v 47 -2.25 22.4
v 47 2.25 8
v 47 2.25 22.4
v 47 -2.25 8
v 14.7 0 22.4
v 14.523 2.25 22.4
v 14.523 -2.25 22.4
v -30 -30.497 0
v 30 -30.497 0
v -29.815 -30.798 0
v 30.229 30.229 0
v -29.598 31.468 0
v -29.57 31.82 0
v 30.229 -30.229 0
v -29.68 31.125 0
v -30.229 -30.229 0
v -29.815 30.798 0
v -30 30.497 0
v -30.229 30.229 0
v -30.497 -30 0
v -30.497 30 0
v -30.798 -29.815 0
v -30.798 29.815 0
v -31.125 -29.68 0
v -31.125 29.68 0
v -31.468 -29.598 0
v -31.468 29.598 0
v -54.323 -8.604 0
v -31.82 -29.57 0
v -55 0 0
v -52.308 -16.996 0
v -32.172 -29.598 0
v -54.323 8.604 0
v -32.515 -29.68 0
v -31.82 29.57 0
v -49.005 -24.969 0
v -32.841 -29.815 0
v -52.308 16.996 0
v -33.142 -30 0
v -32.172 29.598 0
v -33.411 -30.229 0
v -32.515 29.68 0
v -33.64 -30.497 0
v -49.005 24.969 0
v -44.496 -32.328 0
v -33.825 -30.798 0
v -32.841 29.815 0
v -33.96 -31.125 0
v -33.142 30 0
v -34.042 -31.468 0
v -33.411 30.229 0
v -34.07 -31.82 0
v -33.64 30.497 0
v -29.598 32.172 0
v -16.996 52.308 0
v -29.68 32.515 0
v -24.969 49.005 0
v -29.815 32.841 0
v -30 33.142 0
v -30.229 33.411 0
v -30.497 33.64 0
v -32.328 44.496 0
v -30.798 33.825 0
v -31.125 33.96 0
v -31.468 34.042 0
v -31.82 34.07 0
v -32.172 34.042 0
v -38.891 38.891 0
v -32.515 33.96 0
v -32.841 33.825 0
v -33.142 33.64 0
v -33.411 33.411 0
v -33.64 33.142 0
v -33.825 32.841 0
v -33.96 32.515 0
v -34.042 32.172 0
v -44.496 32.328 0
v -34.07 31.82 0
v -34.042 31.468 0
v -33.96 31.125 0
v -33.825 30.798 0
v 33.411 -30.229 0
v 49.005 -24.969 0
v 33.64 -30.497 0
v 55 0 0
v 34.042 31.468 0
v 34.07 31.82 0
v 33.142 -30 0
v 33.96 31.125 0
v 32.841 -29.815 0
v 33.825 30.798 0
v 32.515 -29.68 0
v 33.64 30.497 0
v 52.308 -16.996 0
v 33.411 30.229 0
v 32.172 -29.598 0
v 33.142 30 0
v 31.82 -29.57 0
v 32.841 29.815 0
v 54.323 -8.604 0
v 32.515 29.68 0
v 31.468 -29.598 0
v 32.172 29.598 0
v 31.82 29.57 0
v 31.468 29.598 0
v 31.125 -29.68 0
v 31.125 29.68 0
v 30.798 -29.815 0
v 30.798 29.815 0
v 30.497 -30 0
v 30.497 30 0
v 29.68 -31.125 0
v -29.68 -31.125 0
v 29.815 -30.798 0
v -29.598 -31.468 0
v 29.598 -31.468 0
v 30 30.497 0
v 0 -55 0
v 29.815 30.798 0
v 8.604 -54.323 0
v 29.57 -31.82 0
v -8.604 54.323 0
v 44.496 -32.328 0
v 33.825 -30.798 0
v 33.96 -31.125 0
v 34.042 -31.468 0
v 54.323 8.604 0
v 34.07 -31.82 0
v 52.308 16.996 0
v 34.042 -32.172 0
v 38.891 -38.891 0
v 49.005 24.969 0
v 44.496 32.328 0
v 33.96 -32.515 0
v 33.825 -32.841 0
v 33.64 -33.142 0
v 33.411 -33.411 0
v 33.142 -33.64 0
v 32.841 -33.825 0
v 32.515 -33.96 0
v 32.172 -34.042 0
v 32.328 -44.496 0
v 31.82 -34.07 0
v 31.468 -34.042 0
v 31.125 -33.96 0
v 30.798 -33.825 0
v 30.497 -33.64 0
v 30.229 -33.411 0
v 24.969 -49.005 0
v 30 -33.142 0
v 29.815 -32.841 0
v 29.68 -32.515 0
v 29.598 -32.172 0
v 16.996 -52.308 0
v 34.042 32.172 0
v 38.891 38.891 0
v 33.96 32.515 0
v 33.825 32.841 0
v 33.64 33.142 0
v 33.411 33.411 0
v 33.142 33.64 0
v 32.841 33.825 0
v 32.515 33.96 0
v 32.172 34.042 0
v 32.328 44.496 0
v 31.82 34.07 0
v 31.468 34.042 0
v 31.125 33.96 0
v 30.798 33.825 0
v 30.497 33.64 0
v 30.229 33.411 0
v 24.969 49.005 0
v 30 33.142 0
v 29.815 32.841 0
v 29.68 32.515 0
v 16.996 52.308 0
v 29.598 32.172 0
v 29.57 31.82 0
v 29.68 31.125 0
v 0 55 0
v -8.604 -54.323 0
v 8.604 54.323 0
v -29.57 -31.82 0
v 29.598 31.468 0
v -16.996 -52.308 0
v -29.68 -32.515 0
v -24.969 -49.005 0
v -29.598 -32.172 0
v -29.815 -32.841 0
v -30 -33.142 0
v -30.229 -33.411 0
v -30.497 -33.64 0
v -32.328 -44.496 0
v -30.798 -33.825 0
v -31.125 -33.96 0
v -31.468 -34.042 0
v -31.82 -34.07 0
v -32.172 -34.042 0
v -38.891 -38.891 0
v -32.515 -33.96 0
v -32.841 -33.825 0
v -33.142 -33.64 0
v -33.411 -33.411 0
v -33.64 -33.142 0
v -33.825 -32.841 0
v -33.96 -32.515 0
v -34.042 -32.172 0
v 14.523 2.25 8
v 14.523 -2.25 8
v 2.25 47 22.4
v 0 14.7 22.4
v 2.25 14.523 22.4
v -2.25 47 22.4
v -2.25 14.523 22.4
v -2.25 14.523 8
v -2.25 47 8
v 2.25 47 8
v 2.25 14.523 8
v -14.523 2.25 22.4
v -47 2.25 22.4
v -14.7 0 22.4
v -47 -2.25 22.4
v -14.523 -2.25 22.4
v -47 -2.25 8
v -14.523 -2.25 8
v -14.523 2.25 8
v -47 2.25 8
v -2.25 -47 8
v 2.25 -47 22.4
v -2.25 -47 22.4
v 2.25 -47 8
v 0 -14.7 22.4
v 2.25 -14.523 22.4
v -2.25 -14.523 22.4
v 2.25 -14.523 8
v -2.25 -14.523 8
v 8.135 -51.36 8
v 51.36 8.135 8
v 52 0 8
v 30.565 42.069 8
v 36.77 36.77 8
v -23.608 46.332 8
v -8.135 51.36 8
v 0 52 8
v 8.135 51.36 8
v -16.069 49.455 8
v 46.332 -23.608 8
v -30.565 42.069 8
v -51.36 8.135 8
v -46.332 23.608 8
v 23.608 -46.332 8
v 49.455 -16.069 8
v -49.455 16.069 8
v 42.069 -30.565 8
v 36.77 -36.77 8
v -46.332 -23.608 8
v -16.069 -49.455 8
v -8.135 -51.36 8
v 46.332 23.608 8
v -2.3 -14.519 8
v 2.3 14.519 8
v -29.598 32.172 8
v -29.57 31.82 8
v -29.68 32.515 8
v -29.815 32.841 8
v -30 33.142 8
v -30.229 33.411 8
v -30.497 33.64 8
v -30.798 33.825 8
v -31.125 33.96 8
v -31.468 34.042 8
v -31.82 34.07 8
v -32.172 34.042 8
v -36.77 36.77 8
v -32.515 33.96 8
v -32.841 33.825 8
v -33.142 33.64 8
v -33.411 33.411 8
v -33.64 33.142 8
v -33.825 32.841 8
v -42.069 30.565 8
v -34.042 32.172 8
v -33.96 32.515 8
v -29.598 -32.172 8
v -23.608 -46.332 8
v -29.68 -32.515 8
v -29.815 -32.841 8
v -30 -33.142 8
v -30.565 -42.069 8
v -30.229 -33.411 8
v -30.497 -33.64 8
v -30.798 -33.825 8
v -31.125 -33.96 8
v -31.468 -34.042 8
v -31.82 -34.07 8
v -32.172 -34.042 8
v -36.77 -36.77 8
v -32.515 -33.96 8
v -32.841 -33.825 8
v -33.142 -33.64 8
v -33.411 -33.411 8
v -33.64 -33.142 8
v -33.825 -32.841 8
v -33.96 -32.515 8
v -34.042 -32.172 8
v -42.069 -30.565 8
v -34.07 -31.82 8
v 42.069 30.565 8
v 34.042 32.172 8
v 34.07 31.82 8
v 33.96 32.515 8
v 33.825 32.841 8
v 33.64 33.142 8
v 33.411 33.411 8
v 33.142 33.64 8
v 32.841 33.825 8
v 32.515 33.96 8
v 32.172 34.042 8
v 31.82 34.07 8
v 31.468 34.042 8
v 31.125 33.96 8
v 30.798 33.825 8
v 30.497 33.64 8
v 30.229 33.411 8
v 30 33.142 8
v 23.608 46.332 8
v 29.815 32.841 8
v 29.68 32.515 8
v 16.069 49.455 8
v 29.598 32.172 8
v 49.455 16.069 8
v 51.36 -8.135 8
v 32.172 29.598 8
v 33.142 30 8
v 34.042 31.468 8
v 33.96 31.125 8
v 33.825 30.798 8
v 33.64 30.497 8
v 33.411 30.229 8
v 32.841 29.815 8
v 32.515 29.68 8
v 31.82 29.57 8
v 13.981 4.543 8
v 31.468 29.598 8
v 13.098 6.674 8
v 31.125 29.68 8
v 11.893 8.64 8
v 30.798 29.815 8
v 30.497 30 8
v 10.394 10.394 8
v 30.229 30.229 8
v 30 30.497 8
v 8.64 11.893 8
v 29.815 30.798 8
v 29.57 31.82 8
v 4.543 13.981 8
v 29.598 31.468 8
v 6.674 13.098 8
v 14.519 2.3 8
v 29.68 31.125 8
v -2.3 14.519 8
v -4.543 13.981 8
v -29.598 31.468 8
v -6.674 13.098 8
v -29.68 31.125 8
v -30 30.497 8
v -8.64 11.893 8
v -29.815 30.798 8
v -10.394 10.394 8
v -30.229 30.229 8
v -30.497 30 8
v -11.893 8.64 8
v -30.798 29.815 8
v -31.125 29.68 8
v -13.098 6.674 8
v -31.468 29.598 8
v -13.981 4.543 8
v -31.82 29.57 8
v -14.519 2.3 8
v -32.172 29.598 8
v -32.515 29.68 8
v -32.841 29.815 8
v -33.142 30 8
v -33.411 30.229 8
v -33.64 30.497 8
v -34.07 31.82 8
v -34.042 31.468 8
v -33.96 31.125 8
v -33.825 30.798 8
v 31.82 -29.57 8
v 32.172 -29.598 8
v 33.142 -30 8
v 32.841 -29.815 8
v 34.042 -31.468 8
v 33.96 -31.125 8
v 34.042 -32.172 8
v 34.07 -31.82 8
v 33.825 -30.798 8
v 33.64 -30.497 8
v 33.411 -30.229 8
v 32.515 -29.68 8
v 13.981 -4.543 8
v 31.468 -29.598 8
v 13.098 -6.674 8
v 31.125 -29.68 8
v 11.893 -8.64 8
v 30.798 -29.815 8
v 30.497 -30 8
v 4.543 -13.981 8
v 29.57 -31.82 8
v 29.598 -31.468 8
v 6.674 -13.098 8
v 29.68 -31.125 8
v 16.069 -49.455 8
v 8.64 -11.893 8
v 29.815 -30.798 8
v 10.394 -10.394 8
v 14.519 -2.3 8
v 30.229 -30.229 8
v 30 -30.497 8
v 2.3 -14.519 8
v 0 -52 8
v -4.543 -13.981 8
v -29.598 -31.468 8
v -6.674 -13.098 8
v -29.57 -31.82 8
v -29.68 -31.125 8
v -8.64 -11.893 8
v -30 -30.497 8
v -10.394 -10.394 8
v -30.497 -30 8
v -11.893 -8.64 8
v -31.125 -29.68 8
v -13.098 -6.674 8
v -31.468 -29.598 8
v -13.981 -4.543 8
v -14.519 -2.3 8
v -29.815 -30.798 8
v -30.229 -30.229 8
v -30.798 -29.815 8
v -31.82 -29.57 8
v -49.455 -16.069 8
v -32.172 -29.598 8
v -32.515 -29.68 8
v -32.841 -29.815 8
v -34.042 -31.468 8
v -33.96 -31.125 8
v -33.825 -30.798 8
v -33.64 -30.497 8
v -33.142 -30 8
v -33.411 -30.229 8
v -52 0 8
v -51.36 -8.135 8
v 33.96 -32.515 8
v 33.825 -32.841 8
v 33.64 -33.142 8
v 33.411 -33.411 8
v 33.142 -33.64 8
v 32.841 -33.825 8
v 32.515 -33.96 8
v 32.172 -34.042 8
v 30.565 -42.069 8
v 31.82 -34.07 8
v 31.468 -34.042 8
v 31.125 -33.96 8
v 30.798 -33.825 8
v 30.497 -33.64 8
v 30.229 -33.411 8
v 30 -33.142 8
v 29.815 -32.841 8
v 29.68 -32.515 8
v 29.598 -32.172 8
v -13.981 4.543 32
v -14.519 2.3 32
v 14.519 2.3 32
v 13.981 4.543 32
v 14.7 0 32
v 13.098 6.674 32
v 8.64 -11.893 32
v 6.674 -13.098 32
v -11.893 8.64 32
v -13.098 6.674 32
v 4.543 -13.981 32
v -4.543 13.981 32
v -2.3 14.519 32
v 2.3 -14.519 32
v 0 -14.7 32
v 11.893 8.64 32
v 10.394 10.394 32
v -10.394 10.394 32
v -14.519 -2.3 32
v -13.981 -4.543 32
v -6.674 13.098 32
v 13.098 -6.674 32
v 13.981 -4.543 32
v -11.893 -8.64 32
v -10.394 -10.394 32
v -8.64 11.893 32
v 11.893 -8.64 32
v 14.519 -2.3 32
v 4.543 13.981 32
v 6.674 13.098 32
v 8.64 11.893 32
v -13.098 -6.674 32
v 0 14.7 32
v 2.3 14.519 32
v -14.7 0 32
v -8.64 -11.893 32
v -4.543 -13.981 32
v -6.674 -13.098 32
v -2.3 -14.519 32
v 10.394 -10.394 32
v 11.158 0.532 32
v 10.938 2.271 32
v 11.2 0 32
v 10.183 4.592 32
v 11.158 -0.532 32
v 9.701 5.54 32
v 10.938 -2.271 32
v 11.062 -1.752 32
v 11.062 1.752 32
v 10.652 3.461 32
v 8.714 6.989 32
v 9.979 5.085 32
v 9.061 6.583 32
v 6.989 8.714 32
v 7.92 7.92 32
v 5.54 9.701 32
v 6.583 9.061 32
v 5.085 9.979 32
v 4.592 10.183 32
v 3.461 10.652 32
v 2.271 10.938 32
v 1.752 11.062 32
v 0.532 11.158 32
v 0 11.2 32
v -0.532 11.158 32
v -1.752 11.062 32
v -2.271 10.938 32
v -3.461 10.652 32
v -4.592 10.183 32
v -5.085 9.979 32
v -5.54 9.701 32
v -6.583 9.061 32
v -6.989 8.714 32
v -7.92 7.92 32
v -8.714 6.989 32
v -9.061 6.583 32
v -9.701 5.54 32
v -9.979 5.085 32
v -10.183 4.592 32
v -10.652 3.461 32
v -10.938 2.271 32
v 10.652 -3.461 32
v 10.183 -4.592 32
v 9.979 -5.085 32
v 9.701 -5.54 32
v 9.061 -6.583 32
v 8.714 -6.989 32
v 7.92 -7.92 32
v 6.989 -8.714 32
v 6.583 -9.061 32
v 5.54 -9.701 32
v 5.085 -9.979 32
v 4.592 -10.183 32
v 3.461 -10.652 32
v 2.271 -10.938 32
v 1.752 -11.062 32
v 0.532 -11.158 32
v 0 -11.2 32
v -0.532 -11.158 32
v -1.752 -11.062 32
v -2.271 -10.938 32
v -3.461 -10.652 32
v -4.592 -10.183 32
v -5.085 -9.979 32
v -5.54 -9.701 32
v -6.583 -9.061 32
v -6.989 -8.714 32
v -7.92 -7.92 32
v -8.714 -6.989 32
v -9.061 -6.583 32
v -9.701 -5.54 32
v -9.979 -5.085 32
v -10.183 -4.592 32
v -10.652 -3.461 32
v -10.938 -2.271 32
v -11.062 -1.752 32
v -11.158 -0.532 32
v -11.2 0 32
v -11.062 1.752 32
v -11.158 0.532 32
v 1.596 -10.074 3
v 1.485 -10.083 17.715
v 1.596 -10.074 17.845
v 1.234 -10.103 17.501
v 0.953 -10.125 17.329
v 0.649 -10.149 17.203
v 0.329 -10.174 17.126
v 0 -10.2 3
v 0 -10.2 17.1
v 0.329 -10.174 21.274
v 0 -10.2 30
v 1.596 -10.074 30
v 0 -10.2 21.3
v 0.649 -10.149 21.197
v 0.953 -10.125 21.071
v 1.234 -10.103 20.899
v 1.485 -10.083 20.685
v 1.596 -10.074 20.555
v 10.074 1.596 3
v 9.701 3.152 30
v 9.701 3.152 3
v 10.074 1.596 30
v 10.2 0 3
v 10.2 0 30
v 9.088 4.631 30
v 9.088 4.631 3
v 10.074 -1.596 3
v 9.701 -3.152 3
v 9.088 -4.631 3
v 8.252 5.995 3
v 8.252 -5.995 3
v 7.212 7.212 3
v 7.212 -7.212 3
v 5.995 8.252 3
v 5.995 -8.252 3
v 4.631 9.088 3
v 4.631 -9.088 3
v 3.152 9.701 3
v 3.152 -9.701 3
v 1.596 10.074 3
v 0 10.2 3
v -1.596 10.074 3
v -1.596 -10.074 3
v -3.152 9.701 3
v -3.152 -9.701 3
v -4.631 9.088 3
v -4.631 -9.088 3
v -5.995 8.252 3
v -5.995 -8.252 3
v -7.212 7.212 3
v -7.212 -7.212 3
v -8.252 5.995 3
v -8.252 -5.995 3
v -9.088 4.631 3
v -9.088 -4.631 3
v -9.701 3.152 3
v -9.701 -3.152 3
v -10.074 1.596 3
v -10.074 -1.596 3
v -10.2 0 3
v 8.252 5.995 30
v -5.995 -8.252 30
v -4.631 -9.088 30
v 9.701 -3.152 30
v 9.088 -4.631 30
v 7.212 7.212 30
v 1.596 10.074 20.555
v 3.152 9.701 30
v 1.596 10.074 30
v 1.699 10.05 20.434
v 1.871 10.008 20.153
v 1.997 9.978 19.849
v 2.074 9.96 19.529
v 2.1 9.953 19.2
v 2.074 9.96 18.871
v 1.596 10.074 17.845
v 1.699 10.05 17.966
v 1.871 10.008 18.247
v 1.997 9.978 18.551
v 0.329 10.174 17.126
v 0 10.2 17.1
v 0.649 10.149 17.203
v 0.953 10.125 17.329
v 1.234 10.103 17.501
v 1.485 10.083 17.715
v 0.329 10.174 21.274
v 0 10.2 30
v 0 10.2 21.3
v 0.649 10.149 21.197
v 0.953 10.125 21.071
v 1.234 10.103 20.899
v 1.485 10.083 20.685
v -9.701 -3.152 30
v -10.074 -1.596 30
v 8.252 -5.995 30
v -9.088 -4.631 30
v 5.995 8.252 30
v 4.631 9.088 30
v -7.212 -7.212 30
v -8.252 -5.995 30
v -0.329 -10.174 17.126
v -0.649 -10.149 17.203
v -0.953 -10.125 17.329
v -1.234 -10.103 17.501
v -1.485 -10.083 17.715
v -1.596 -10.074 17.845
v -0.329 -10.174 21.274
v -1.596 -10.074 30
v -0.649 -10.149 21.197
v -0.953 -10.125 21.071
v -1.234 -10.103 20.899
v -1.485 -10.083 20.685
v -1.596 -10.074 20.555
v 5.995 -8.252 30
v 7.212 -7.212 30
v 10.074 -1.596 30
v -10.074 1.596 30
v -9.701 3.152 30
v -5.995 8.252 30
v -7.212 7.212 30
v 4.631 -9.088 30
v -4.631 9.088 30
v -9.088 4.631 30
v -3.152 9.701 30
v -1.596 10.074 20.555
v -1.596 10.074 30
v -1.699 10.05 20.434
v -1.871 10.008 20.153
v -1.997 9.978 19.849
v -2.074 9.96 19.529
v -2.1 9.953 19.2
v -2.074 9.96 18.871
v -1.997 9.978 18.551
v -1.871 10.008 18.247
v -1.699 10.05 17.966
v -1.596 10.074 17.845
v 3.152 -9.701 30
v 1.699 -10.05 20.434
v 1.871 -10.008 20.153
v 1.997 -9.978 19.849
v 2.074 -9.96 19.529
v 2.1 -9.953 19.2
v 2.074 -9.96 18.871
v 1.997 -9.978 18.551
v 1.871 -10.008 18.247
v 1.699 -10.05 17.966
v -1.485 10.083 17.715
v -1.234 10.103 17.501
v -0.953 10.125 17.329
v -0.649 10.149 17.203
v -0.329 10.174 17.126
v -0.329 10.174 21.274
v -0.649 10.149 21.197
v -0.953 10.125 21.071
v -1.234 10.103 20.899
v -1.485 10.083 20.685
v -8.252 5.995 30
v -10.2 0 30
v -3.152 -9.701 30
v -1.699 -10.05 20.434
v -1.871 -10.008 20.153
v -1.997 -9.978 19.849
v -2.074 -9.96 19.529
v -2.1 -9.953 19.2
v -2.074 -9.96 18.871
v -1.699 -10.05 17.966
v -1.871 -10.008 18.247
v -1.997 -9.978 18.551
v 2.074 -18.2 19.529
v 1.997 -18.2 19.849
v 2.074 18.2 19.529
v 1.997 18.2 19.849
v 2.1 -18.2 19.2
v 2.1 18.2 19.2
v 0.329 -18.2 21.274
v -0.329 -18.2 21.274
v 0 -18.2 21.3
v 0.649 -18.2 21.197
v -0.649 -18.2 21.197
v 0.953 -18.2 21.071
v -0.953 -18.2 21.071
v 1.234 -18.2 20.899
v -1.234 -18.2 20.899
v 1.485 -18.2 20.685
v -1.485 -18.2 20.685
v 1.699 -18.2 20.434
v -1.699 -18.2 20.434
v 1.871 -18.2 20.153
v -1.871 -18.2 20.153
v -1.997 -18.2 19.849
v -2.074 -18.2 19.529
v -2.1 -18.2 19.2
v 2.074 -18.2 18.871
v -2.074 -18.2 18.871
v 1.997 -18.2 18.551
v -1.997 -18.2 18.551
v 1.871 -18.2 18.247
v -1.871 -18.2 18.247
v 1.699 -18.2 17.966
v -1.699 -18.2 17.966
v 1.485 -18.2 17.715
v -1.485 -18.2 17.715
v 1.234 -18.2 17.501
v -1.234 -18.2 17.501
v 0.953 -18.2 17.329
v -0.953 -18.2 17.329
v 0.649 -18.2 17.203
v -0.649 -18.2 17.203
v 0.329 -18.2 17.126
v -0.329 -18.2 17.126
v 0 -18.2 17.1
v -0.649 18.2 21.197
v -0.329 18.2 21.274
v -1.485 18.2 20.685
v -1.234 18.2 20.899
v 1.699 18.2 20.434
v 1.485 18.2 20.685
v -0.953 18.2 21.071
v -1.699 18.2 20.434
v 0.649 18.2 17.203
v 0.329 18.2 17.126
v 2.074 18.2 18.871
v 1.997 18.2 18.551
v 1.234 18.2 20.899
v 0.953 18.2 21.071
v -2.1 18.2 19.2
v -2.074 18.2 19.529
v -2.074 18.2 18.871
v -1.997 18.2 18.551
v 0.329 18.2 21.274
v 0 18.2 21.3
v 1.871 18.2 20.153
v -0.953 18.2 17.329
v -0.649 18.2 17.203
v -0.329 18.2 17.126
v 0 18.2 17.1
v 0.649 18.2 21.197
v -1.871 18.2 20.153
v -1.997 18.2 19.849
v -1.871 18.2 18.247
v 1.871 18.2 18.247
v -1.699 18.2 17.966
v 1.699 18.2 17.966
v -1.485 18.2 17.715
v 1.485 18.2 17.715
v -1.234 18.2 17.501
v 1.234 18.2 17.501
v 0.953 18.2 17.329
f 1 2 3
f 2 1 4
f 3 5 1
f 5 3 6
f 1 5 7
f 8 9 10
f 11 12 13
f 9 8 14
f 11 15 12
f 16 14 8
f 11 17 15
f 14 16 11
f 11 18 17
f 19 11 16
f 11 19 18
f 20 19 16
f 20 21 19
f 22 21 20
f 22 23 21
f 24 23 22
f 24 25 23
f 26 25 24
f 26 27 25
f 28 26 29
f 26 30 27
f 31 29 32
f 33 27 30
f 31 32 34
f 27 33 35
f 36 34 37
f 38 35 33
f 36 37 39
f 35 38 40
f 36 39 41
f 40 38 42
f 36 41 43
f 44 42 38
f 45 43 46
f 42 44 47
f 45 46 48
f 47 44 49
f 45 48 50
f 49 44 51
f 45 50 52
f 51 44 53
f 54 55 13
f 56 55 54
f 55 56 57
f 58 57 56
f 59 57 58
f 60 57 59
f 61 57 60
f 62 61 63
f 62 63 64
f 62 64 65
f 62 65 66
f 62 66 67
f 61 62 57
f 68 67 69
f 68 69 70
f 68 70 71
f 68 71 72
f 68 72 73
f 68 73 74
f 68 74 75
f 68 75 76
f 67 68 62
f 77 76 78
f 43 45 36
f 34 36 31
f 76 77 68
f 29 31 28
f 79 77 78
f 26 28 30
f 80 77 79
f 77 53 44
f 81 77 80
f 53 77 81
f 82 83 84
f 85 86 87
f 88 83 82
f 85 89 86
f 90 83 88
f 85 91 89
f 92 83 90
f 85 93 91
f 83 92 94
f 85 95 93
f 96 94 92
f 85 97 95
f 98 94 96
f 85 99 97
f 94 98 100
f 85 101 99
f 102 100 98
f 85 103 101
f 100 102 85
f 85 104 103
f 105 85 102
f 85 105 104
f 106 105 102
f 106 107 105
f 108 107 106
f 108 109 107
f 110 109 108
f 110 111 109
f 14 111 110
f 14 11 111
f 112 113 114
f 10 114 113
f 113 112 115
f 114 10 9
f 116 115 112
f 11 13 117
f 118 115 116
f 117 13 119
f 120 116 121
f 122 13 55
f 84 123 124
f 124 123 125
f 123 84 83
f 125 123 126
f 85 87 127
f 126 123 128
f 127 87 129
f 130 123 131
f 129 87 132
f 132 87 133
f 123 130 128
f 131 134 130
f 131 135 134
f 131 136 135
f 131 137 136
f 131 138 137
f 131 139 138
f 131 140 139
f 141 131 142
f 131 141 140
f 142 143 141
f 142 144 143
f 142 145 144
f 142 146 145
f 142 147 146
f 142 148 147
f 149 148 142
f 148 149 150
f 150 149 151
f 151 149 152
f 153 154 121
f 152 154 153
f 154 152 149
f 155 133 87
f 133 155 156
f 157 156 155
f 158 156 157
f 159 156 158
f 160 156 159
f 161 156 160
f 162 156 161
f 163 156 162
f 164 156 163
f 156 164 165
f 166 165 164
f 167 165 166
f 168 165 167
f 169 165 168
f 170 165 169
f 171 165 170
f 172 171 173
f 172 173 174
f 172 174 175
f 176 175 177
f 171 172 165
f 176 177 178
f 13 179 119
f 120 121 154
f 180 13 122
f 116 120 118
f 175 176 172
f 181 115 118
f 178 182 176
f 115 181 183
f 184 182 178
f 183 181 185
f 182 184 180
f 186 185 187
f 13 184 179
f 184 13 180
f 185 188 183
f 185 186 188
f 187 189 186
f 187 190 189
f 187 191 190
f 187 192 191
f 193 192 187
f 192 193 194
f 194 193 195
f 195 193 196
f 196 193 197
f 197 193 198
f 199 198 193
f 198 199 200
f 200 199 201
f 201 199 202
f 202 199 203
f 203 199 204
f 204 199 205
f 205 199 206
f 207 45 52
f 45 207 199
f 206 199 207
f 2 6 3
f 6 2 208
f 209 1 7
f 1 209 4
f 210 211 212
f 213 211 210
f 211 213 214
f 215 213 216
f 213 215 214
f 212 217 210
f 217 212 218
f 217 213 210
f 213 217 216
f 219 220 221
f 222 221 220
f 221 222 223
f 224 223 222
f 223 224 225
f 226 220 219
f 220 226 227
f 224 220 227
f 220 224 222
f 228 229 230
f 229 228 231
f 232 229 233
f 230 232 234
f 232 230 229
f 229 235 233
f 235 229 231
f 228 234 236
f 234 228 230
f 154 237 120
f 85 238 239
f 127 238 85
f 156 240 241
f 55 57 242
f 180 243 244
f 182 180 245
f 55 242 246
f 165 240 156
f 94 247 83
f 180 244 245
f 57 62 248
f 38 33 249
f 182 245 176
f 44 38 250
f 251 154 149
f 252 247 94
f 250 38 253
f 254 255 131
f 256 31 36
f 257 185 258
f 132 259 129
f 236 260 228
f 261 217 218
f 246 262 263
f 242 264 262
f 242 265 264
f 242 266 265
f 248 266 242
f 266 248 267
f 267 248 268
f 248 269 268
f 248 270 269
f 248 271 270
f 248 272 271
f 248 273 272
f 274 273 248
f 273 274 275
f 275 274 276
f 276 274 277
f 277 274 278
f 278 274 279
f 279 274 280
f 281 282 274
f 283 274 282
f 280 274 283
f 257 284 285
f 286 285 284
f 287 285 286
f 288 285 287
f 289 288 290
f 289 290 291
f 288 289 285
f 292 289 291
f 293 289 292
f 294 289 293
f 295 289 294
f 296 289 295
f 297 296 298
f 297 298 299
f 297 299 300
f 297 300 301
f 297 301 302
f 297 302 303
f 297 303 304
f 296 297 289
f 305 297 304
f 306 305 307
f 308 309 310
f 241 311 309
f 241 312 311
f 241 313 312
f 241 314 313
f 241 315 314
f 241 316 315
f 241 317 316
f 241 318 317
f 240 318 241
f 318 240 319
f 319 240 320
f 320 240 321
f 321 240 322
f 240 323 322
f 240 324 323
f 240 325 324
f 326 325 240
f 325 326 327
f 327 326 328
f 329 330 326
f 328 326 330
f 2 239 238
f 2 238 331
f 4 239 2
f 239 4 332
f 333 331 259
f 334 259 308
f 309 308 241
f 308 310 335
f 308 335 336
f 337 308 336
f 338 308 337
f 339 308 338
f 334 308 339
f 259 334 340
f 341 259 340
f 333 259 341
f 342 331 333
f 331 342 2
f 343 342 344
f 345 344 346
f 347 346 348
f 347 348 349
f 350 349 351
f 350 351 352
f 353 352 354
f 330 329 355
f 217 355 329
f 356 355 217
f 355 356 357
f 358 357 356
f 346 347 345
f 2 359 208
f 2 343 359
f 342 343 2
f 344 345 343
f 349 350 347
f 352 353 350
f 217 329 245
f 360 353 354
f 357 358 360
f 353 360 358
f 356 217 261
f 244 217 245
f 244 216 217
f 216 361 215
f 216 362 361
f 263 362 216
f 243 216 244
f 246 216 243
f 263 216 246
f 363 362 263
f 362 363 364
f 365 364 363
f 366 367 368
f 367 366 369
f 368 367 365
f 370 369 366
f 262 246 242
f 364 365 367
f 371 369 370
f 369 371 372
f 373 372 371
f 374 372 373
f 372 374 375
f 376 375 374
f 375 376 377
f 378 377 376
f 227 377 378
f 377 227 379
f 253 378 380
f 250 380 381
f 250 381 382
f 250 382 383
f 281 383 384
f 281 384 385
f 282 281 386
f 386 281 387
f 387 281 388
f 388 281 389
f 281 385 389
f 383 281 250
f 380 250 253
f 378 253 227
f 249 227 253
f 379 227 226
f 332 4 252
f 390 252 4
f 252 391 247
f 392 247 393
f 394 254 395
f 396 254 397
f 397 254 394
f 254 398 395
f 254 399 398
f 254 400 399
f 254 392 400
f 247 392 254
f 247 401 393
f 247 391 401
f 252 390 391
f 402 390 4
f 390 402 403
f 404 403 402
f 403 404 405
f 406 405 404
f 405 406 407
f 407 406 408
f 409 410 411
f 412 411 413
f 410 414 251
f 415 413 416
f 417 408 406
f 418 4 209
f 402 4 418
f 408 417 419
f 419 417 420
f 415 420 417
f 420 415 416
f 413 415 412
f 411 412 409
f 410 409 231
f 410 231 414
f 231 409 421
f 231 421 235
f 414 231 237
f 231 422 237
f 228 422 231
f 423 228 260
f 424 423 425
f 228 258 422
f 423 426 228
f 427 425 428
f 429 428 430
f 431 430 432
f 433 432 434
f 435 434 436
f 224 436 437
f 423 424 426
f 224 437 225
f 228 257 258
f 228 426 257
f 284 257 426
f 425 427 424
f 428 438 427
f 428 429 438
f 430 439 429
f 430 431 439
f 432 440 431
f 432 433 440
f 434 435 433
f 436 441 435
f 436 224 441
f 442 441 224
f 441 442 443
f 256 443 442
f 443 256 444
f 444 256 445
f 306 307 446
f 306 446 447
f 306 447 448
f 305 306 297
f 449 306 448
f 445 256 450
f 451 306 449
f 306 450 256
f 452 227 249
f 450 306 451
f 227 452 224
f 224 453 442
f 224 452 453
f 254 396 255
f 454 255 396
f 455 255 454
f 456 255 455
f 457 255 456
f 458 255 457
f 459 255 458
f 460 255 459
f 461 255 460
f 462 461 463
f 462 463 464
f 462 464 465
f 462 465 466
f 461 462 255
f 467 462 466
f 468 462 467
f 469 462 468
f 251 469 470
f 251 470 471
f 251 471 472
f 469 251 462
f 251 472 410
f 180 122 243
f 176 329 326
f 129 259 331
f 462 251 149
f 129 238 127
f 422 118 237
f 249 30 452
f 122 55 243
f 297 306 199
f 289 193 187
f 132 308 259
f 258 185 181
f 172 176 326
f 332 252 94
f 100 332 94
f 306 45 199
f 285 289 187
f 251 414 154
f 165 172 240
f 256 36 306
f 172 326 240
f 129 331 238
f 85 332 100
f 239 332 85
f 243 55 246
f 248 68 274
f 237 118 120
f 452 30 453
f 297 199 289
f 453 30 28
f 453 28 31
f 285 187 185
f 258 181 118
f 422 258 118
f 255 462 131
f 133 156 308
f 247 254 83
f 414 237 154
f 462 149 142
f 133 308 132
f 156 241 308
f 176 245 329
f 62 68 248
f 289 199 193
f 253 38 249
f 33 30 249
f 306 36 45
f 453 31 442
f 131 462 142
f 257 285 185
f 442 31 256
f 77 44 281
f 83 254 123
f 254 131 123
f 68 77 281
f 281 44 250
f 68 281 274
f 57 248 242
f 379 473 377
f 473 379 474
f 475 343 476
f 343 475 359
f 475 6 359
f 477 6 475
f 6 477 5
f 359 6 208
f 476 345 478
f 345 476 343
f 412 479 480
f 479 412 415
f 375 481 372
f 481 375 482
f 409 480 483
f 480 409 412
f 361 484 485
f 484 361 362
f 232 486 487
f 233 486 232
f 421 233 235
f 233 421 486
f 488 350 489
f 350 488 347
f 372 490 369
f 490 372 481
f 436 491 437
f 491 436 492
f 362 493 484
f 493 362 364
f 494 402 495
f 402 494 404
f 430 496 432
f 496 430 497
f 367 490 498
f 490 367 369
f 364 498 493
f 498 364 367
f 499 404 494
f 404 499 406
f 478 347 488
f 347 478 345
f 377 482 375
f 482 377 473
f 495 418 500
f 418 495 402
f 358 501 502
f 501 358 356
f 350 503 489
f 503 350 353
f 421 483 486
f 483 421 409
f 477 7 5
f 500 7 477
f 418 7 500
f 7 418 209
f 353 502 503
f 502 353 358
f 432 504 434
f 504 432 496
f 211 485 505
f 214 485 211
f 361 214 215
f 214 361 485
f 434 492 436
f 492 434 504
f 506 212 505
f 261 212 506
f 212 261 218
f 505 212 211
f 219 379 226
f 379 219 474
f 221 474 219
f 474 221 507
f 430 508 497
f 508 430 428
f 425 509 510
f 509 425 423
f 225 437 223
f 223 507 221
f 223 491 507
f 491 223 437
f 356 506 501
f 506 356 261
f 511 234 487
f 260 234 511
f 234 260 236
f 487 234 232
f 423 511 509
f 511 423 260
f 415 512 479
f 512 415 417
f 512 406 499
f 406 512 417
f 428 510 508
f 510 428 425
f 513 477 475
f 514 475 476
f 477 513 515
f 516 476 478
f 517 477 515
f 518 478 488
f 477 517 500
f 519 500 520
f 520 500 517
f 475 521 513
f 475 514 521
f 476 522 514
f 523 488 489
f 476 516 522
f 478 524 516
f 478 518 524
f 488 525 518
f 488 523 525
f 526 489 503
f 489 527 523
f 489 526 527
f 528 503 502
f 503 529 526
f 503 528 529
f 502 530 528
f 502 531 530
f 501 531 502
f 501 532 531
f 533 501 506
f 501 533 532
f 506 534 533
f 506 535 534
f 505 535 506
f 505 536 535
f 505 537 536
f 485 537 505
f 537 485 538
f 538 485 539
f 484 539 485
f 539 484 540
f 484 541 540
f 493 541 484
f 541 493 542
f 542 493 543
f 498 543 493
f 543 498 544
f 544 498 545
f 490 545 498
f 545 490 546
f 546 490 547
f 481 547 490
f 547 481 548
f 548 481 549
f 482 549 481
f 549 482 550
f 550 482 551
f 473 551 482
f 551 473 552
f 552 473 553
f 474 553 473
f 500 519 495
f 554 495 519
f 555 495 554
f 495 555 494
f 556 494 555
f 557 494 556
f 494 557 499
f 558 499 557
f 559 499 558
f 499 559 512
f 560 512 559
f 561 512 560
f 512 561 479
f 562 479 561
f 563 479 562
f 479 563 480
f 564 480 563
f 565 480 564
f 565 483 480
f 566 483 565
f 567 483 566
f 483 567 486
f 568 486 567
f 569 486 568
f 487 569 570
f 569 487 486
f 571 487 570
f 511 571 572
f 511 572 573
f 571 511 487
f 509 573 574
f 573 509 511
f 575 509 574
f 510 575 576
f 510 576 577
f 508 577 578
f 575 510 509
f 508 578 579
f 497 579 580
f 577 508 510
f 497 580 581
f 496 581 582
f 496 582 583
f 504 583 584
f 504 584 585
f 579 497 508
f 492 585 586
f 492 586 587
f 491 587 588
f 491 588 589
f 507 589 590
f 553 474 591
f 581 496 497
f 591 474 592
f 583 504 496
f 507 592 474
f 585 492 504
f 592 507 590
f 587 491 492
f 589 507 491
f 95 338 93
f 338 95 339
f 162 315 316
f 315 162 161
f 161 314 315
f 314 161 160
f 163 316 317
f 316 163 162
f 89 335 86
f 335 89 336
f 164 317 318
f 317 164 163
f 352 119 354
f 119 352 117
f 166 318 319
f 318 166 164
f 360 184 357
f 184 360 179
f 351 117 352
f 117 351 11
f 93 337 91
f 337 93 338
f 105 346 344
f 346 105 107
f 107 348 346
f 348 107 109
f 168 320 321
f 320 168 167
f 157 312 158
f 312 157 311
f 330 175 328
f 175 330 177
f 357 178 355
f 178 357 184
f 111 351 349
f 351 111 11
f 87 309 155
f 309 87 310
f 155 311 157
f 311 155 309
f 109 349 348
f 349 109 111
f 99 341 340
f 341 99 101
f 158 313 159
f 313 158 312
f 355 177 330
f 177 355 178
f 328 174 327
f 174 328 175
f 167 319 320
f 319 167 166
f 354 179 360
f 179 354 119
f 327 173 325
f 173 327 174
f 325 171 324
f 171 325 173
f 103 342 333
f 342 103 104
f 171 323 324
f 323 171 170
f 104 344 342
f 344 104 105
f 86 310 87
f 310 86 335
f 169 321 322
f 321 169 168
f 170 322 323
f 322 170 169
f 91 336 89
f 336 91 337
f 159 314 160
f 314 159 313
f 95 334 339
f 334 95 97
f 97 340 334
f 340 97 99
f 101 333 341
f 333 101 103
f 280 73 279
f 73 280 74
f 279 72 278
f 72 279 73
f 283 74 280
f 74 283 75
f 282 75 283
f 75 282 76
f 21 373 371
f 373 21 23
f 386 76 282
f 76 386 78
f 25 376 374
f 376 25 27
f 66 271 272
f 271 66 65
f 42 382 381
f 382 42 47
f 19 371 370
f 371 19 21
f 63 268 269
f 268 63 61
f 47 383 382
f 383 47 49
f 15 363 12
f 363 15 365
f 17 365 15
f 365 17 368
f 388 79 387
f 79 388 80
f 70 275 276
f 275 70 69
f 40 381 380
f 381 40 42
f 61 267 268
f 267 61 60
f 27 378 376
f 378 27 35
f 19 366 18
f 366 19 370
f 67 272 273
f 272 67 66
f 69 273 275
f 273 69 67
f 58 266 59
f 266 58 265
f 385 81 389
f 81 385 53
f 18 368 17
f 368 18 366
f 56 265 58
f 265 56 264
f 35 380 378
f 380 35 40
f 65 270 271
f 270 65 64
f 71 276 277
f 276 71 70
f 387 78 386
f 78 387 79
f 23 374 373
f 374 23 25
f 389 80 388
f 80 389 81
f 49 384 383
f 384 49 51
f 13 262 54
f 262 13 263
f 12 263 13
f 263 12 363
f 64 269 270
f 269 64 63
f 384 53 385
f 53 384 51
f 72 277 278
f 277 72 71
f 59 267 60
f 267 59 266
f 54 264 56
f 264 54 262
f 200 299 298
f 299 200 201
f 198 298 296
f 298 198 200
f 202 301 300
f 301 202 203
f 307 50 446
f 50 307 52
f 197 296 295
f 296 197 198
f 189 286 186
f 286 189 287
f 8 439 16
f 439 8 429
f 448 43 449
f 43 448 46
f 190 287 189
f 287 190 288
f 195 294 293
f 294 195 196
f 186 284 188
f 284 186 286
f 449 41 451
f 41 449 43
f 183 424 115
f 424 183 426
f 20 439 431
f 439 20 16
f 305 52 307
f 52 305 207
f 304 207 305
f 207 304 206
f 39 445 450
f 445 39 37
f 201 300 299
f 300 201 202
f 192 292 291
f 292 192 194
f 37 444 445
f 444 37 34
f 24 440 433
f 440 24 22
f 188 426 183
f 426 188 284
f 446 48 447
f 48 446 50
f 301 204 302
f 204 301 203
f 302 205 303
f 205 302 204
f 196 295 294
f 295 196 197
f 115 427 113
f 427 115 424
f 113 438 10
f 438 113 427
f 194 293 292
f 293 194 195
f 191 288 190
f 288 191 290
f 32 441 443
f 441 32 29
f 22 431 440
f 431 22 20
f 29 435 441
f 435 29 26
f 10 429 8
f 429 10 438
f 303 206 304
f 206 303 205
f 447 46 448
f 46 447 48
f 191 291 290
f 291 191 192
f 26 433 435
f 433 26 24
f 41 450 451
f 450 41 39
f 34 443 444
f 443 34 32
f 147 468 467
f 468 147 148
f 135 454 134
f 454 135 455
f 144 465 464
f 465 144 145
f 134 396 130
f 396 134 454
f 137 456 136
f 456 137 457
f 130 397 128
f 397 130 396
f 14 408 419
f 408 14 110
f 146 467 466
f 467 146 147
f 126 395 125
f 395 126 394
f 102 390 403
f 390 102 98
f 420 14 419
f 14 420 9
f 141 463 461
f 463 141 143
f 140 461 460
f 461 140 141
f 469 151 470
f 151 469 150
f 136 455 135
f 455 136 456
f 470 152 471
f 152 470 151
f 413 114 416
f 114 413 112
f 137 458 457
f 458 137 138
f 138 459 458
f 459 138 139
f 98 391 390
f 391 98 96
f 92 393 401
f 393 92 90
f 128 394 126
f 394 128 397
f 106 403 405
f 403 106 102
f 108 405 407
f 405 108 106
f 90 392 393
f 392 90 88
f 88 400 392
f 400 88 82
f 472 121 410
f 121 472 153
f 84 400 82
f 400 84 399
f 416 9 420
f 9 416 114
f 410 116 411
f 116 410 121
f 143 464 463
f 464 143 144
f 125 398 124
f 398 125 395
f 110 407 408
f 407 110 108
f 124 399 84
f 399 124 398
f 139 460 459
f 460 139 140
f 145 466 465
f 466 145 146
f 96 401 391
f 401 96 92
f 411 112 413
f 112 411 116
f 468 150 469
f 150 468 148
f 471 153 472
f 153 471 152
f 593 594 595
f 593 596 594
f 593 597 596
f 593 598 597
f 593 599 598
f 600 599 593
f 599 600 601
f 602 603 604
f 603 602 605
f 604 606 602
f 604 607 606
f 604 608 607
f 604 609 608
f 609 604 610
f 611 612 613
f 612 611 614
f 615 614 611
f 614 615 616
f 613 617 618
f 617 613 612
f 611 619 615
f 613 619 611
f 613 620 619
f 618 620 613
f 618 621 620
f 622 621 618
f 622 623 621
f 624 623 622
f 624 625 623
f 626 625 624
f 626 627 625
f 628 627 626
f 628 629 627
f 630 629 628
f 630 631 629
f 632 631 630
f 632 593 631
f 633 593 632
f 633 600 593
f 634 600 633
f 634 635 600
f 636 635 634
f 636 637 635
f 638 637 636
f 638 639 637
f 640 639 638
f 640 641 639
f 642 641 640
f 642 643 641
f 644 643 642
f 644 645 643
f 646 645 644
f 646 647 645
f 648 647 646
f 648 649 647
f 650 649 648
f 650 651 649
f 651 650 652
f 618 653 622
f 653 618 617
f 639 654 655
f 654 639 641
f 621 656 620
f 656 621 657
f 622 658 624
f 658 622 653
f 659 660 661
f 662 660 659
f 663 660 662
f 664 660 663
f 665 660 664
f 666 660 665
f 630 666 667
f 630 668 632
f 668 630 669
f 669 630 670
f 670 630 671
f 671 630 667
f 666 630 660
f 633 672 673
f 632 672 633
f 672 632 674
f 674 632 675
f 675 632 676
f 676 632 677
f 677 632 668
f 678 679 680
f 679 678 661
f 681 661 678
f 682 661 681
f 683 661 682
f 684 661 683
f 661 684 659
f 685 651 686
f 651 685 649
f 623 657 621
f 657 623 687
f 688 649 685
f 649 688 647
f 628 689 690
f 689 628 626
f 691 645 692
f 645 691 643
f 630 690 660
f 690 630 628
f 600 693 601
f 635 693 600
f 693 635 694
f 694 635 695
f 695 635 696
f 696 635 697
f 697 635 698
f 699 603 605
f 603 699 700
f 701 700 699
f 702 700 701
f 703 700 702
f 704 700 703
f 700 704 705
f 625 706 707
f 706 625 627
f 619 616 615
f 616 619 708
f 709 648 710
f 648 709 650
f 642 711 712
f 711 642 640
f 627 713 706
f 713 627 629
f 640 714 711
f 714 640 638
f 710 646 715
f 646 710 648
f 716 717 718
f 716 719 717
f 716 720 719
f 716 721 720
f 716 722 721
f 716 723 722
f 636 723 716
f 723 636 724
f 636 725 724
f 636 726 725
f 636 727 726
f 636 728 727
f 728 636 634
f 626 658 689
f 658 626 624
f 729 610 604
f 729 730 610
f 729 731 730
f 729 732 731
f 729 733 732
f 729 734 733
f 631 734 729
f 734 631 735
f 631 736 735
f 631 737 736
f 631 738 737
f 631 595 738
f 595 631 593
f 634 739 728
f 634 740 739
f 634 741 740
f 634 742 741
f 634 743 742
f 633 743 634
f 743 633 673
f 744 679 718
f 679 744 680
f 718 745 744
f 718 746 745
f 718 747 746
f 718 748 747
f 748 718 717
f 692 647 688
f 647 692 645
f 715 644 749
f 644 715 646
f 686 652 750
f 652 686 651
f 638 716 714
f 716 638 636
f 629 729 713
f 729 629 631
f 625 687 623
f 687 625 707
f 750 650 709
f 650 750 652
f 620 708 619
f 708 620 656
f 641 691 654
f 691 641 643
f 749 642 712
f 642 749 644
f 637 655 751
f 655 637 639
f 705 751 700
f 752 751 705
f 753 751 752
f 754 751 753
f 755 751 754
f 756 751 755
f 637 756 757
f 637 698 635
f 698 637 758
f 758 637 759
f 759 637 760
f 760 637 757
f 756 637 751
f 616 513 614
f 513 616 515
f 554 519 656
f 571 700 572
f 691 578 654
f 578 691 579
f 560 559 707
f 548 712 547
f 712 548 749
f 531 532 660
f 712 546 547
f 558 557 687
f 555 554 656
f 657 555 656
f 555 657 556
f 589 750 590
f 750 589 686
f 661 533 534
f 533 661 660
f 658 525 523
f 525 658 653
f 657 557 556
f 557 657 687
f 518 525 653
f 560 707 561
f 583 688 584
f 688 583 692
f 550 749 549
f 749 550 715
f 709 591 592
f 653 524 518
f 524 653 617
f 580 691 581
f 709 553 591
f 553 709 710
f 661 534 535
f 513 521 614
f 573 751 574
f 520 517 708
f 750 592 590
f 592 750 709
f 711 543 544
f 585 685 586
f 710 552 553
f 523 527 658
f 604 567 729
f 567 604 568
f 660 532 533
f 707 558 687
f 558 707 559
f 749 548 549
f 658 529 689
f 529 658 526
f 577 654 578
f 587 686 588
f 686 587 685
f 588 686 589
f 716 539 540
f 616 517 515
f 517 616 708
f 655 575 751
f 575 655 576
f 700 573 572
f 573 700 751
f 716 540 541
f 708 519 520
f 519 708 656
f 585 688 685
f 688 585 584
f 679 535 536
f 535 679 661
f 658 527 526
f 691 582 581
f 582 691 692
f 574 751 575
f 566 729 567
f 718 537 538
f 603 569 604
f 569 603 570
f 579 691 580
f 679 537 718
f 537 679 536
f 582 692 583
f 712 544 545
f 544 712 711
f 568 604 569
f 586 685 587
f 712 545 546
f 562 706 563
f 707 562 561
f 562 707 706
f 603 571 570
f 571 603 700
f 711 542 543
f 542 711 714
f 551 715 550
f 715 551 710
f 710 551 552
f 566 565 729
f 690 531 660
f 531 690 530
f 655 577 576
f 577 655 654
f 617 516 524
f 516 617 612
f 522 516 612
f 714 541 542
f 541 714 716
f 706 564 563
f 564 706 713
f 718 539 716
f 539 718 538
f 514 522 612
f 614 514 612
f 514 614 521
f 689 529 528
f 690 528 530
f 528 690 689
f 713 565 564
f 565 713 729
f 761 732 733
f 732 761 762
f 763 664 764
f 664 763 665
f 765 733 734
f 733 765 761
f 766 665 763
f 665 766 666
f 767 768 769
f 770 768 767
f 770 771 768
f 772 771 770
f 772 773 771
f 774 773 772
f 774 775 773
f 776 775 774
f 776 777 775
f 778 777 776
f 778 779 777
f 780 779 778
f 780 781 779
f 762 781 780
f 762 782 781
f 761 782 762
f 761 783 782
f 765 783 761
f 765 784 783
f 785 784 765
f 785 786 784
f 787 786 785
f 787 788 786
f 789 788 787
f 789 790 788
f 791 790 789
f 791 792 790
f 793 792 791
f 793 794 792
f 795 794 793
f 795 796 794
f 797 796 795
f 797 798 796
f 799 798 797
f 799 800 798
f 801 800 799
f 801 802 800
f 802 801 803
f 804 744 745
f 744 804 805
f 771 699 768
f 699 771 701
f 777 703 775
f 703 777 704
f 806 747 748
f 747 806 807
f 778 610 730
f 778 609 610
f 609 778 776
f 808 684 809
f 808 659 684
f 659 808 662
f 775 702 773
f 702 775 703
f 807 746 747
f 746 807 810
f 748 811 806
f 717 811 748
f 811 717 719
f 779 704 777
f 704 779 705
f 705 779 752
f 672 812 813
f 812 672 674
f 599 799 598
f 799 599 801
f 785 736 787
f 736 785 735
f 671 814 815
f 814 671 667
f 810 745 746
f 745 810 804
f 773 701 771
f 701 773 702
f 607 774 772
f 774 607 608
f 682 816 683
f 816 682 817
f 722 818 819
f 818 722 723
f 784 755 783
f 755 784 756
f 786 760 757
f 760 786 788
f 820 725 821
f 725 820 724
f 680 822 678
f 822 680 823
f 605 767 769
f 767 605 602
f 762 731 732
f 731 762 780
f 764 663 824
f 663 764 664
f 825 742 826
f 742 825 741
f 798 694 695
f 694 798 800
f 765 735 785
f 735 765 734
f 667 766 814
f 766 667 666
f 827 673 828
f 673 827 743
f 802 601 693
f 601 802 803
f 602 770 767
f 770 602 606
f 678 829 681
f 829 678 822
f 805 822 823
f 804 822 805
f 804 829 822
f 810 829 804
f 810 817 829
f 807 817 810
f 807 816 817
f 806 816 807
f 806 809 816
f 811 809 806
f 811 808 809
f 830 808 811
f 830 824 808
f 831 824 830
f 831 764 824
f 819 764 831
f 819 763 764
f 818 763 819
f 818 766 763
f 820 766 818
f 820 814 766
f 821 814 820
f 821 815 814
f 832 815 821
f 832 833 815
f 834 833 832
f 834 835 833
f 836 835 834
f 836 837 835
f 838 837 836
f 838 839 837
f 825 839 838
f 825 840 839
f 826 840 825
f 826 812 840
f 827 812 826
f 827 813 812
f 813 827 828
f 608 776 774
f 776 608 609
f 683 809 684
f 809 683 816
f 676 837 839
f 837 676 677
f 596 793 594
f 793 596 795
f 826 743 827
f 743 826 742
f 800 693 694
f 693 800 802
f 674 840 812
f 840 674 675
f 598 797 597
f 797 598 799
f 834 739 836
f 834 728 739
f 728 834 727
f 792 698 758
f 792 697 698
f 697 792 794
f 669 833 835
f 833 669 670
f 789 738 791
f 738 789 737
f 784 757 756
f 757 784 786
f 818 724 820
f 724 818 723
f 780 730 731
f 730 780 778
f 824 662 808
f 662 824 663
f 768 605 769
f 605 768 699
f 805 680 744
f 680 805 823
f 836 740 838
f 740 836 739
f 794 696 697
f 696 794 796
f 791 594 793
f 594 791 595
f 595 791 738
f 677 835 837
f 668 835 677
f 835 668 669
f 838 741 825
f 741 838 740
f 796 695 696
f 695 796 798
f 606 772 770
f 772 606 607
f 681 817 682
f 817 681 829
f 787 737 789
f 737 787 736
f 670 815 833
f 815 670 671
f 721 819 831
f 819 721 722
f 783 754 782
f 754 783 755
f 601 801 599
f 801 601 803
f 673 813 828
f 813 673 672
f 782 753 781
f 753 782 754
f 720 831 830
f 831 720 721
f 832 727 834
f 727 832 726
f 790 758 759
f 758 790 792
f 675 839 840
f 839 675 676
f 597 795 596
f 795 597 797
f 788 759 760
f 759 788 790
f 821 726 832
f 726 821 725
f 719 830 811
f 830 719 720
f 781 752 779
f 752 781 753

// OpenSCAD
// file: tower_base_and_stand.scad
// ====================================================================
// Tower Base & Modular Mast (100% 3D-Printable)
// 
// Features:
// - Wide, stable holiday-styled baseplate (can be clamped, screwed, or weighted)
// - 20mm upper socket accepts:
//     Option A: Standard wooden dowel or PVC pipe (custom height)
//     Option B: Stackable 3D-printed lattice mast segments (provided below)
// ====================================================================

$fn = 40;

base_dia       = 110.0; // Wide footprint for stability against cable tension
base_th        = 8.0;   // Solid base thickness
socket_inner_d = 20.4;  // Fits 20mm dowel or lattice mast plug
socket_wall    = 4.5;
socket_h       = 32.0;

// 1. Sturdy Baseplate
module tower_base() {
    difference() {
        union() {
            // Main disc with beveled edge
            cylinder(d1 = base_dia, d2 = base_dia - 6, h = base_th);
            
            // Central socket column
            translate([0, 0, 0])
                cylinder(d = socket_inner_d + (socket_wall * 2), h = socket_h);
                
            // 4x Rigid support ribs
            for (a = [0 : 90 : 270]) {
                rotate([0, 0, a])
                    translate([socket_inner_d / 2, -socket_wall / 2, 0])
                        cube([base_dia / 2 - socket_inner_d / 2 - 8, socket_wall, socket_h * 0.7]);
            }
        }

        // Central dowel/mast socket with self-centering lead-in chamfer
        translate([0, 0, 3])
            cylinder(d = socket_inner_d, h = socket_h + 2);
        translate([0, 0, socket_h - 2])
            cylinder(d1 = socket_inner_d, d2 = socket_inner_d + 3.0, h = 3.0);

        // 4x Perimeter screw/mounting holes (optional hold-down screws/clamps)
        for (a = [45 : 90 : 315]) {
            rotate([0, 0, a])
                translate([base_dia / 2 - 10, 0, -1])
                    cylinder(d = 4.5, h = base_th + 4);
        }

        // Cross-pin clamp hole for socket
        translate([0, 0, socket_h * 0.6])
            rotate([90, 0, 0])
                cylinder(d = 4.2, h = socket_inner_d + 16, center = true);
    }
}

// 2. Optional 3D-Printable Lattice Mast Segment (Stackable)
module tower_mast_segment(height = 100) {
    difference() {
        union() {
            // Main lattice column
            cylinder(d = 20.0, h = height);
            
            // Lower plug that fits into tower_base socket
            translate([0, 0, -24])
                cylinder(d = 20.0, h = 24);
        }
        
        // Upper receiving socket for stacking another segment or tower head
        translate([0, 0, height - 24])
            cylinder(d = socket_inner_d, h = 26);
            
        // Hollow interior for lightness / wiring (pass motor wires internally in Phase 2!)
        cylinder(d = 12.0, h = height + 10, center = true);
        
        // Decorative / lightweight lattice cutouts
        for (z = [15 : 20 : height - 20]) {
            translate([0, 0, z])
                rotate([90, 0, 0])
                    cylinder(d = 10, h = 24, center = true);
            translate([0, 0, z + 10])
                rotate([0, 90, 0])
                    cylinder(d = 10, h = 24, center = true);
        }
    }
}

// ====================================================================
// Selection
// ====================================================================
part = "base"; // "base" or "mast"

if (part == "base") {
    tower_base();
} else if (part == "mast") {
    tower_mast_segment(100);
}
// main file
// ====================================================================
// [PRINT 09] Sturdy 110mm Tower Baseplate
// Sits 100% flat on circular bottom at Z = 0.
// Self-centering lead-in chamfer for 20mm (3/4") mast dowels or PVC pipes.
// Includes 4x perimeter hold-down clamp/screw tabs.
// (Print 2 of this file: one for Tower A, one for Tower B).
// ZERO SUPPORTS NEEDED!
// ====================================================================

use <tower_base_and_stand.scad>;

$fn = 60;

// Centered on bed at Z = 0
tower_base();
